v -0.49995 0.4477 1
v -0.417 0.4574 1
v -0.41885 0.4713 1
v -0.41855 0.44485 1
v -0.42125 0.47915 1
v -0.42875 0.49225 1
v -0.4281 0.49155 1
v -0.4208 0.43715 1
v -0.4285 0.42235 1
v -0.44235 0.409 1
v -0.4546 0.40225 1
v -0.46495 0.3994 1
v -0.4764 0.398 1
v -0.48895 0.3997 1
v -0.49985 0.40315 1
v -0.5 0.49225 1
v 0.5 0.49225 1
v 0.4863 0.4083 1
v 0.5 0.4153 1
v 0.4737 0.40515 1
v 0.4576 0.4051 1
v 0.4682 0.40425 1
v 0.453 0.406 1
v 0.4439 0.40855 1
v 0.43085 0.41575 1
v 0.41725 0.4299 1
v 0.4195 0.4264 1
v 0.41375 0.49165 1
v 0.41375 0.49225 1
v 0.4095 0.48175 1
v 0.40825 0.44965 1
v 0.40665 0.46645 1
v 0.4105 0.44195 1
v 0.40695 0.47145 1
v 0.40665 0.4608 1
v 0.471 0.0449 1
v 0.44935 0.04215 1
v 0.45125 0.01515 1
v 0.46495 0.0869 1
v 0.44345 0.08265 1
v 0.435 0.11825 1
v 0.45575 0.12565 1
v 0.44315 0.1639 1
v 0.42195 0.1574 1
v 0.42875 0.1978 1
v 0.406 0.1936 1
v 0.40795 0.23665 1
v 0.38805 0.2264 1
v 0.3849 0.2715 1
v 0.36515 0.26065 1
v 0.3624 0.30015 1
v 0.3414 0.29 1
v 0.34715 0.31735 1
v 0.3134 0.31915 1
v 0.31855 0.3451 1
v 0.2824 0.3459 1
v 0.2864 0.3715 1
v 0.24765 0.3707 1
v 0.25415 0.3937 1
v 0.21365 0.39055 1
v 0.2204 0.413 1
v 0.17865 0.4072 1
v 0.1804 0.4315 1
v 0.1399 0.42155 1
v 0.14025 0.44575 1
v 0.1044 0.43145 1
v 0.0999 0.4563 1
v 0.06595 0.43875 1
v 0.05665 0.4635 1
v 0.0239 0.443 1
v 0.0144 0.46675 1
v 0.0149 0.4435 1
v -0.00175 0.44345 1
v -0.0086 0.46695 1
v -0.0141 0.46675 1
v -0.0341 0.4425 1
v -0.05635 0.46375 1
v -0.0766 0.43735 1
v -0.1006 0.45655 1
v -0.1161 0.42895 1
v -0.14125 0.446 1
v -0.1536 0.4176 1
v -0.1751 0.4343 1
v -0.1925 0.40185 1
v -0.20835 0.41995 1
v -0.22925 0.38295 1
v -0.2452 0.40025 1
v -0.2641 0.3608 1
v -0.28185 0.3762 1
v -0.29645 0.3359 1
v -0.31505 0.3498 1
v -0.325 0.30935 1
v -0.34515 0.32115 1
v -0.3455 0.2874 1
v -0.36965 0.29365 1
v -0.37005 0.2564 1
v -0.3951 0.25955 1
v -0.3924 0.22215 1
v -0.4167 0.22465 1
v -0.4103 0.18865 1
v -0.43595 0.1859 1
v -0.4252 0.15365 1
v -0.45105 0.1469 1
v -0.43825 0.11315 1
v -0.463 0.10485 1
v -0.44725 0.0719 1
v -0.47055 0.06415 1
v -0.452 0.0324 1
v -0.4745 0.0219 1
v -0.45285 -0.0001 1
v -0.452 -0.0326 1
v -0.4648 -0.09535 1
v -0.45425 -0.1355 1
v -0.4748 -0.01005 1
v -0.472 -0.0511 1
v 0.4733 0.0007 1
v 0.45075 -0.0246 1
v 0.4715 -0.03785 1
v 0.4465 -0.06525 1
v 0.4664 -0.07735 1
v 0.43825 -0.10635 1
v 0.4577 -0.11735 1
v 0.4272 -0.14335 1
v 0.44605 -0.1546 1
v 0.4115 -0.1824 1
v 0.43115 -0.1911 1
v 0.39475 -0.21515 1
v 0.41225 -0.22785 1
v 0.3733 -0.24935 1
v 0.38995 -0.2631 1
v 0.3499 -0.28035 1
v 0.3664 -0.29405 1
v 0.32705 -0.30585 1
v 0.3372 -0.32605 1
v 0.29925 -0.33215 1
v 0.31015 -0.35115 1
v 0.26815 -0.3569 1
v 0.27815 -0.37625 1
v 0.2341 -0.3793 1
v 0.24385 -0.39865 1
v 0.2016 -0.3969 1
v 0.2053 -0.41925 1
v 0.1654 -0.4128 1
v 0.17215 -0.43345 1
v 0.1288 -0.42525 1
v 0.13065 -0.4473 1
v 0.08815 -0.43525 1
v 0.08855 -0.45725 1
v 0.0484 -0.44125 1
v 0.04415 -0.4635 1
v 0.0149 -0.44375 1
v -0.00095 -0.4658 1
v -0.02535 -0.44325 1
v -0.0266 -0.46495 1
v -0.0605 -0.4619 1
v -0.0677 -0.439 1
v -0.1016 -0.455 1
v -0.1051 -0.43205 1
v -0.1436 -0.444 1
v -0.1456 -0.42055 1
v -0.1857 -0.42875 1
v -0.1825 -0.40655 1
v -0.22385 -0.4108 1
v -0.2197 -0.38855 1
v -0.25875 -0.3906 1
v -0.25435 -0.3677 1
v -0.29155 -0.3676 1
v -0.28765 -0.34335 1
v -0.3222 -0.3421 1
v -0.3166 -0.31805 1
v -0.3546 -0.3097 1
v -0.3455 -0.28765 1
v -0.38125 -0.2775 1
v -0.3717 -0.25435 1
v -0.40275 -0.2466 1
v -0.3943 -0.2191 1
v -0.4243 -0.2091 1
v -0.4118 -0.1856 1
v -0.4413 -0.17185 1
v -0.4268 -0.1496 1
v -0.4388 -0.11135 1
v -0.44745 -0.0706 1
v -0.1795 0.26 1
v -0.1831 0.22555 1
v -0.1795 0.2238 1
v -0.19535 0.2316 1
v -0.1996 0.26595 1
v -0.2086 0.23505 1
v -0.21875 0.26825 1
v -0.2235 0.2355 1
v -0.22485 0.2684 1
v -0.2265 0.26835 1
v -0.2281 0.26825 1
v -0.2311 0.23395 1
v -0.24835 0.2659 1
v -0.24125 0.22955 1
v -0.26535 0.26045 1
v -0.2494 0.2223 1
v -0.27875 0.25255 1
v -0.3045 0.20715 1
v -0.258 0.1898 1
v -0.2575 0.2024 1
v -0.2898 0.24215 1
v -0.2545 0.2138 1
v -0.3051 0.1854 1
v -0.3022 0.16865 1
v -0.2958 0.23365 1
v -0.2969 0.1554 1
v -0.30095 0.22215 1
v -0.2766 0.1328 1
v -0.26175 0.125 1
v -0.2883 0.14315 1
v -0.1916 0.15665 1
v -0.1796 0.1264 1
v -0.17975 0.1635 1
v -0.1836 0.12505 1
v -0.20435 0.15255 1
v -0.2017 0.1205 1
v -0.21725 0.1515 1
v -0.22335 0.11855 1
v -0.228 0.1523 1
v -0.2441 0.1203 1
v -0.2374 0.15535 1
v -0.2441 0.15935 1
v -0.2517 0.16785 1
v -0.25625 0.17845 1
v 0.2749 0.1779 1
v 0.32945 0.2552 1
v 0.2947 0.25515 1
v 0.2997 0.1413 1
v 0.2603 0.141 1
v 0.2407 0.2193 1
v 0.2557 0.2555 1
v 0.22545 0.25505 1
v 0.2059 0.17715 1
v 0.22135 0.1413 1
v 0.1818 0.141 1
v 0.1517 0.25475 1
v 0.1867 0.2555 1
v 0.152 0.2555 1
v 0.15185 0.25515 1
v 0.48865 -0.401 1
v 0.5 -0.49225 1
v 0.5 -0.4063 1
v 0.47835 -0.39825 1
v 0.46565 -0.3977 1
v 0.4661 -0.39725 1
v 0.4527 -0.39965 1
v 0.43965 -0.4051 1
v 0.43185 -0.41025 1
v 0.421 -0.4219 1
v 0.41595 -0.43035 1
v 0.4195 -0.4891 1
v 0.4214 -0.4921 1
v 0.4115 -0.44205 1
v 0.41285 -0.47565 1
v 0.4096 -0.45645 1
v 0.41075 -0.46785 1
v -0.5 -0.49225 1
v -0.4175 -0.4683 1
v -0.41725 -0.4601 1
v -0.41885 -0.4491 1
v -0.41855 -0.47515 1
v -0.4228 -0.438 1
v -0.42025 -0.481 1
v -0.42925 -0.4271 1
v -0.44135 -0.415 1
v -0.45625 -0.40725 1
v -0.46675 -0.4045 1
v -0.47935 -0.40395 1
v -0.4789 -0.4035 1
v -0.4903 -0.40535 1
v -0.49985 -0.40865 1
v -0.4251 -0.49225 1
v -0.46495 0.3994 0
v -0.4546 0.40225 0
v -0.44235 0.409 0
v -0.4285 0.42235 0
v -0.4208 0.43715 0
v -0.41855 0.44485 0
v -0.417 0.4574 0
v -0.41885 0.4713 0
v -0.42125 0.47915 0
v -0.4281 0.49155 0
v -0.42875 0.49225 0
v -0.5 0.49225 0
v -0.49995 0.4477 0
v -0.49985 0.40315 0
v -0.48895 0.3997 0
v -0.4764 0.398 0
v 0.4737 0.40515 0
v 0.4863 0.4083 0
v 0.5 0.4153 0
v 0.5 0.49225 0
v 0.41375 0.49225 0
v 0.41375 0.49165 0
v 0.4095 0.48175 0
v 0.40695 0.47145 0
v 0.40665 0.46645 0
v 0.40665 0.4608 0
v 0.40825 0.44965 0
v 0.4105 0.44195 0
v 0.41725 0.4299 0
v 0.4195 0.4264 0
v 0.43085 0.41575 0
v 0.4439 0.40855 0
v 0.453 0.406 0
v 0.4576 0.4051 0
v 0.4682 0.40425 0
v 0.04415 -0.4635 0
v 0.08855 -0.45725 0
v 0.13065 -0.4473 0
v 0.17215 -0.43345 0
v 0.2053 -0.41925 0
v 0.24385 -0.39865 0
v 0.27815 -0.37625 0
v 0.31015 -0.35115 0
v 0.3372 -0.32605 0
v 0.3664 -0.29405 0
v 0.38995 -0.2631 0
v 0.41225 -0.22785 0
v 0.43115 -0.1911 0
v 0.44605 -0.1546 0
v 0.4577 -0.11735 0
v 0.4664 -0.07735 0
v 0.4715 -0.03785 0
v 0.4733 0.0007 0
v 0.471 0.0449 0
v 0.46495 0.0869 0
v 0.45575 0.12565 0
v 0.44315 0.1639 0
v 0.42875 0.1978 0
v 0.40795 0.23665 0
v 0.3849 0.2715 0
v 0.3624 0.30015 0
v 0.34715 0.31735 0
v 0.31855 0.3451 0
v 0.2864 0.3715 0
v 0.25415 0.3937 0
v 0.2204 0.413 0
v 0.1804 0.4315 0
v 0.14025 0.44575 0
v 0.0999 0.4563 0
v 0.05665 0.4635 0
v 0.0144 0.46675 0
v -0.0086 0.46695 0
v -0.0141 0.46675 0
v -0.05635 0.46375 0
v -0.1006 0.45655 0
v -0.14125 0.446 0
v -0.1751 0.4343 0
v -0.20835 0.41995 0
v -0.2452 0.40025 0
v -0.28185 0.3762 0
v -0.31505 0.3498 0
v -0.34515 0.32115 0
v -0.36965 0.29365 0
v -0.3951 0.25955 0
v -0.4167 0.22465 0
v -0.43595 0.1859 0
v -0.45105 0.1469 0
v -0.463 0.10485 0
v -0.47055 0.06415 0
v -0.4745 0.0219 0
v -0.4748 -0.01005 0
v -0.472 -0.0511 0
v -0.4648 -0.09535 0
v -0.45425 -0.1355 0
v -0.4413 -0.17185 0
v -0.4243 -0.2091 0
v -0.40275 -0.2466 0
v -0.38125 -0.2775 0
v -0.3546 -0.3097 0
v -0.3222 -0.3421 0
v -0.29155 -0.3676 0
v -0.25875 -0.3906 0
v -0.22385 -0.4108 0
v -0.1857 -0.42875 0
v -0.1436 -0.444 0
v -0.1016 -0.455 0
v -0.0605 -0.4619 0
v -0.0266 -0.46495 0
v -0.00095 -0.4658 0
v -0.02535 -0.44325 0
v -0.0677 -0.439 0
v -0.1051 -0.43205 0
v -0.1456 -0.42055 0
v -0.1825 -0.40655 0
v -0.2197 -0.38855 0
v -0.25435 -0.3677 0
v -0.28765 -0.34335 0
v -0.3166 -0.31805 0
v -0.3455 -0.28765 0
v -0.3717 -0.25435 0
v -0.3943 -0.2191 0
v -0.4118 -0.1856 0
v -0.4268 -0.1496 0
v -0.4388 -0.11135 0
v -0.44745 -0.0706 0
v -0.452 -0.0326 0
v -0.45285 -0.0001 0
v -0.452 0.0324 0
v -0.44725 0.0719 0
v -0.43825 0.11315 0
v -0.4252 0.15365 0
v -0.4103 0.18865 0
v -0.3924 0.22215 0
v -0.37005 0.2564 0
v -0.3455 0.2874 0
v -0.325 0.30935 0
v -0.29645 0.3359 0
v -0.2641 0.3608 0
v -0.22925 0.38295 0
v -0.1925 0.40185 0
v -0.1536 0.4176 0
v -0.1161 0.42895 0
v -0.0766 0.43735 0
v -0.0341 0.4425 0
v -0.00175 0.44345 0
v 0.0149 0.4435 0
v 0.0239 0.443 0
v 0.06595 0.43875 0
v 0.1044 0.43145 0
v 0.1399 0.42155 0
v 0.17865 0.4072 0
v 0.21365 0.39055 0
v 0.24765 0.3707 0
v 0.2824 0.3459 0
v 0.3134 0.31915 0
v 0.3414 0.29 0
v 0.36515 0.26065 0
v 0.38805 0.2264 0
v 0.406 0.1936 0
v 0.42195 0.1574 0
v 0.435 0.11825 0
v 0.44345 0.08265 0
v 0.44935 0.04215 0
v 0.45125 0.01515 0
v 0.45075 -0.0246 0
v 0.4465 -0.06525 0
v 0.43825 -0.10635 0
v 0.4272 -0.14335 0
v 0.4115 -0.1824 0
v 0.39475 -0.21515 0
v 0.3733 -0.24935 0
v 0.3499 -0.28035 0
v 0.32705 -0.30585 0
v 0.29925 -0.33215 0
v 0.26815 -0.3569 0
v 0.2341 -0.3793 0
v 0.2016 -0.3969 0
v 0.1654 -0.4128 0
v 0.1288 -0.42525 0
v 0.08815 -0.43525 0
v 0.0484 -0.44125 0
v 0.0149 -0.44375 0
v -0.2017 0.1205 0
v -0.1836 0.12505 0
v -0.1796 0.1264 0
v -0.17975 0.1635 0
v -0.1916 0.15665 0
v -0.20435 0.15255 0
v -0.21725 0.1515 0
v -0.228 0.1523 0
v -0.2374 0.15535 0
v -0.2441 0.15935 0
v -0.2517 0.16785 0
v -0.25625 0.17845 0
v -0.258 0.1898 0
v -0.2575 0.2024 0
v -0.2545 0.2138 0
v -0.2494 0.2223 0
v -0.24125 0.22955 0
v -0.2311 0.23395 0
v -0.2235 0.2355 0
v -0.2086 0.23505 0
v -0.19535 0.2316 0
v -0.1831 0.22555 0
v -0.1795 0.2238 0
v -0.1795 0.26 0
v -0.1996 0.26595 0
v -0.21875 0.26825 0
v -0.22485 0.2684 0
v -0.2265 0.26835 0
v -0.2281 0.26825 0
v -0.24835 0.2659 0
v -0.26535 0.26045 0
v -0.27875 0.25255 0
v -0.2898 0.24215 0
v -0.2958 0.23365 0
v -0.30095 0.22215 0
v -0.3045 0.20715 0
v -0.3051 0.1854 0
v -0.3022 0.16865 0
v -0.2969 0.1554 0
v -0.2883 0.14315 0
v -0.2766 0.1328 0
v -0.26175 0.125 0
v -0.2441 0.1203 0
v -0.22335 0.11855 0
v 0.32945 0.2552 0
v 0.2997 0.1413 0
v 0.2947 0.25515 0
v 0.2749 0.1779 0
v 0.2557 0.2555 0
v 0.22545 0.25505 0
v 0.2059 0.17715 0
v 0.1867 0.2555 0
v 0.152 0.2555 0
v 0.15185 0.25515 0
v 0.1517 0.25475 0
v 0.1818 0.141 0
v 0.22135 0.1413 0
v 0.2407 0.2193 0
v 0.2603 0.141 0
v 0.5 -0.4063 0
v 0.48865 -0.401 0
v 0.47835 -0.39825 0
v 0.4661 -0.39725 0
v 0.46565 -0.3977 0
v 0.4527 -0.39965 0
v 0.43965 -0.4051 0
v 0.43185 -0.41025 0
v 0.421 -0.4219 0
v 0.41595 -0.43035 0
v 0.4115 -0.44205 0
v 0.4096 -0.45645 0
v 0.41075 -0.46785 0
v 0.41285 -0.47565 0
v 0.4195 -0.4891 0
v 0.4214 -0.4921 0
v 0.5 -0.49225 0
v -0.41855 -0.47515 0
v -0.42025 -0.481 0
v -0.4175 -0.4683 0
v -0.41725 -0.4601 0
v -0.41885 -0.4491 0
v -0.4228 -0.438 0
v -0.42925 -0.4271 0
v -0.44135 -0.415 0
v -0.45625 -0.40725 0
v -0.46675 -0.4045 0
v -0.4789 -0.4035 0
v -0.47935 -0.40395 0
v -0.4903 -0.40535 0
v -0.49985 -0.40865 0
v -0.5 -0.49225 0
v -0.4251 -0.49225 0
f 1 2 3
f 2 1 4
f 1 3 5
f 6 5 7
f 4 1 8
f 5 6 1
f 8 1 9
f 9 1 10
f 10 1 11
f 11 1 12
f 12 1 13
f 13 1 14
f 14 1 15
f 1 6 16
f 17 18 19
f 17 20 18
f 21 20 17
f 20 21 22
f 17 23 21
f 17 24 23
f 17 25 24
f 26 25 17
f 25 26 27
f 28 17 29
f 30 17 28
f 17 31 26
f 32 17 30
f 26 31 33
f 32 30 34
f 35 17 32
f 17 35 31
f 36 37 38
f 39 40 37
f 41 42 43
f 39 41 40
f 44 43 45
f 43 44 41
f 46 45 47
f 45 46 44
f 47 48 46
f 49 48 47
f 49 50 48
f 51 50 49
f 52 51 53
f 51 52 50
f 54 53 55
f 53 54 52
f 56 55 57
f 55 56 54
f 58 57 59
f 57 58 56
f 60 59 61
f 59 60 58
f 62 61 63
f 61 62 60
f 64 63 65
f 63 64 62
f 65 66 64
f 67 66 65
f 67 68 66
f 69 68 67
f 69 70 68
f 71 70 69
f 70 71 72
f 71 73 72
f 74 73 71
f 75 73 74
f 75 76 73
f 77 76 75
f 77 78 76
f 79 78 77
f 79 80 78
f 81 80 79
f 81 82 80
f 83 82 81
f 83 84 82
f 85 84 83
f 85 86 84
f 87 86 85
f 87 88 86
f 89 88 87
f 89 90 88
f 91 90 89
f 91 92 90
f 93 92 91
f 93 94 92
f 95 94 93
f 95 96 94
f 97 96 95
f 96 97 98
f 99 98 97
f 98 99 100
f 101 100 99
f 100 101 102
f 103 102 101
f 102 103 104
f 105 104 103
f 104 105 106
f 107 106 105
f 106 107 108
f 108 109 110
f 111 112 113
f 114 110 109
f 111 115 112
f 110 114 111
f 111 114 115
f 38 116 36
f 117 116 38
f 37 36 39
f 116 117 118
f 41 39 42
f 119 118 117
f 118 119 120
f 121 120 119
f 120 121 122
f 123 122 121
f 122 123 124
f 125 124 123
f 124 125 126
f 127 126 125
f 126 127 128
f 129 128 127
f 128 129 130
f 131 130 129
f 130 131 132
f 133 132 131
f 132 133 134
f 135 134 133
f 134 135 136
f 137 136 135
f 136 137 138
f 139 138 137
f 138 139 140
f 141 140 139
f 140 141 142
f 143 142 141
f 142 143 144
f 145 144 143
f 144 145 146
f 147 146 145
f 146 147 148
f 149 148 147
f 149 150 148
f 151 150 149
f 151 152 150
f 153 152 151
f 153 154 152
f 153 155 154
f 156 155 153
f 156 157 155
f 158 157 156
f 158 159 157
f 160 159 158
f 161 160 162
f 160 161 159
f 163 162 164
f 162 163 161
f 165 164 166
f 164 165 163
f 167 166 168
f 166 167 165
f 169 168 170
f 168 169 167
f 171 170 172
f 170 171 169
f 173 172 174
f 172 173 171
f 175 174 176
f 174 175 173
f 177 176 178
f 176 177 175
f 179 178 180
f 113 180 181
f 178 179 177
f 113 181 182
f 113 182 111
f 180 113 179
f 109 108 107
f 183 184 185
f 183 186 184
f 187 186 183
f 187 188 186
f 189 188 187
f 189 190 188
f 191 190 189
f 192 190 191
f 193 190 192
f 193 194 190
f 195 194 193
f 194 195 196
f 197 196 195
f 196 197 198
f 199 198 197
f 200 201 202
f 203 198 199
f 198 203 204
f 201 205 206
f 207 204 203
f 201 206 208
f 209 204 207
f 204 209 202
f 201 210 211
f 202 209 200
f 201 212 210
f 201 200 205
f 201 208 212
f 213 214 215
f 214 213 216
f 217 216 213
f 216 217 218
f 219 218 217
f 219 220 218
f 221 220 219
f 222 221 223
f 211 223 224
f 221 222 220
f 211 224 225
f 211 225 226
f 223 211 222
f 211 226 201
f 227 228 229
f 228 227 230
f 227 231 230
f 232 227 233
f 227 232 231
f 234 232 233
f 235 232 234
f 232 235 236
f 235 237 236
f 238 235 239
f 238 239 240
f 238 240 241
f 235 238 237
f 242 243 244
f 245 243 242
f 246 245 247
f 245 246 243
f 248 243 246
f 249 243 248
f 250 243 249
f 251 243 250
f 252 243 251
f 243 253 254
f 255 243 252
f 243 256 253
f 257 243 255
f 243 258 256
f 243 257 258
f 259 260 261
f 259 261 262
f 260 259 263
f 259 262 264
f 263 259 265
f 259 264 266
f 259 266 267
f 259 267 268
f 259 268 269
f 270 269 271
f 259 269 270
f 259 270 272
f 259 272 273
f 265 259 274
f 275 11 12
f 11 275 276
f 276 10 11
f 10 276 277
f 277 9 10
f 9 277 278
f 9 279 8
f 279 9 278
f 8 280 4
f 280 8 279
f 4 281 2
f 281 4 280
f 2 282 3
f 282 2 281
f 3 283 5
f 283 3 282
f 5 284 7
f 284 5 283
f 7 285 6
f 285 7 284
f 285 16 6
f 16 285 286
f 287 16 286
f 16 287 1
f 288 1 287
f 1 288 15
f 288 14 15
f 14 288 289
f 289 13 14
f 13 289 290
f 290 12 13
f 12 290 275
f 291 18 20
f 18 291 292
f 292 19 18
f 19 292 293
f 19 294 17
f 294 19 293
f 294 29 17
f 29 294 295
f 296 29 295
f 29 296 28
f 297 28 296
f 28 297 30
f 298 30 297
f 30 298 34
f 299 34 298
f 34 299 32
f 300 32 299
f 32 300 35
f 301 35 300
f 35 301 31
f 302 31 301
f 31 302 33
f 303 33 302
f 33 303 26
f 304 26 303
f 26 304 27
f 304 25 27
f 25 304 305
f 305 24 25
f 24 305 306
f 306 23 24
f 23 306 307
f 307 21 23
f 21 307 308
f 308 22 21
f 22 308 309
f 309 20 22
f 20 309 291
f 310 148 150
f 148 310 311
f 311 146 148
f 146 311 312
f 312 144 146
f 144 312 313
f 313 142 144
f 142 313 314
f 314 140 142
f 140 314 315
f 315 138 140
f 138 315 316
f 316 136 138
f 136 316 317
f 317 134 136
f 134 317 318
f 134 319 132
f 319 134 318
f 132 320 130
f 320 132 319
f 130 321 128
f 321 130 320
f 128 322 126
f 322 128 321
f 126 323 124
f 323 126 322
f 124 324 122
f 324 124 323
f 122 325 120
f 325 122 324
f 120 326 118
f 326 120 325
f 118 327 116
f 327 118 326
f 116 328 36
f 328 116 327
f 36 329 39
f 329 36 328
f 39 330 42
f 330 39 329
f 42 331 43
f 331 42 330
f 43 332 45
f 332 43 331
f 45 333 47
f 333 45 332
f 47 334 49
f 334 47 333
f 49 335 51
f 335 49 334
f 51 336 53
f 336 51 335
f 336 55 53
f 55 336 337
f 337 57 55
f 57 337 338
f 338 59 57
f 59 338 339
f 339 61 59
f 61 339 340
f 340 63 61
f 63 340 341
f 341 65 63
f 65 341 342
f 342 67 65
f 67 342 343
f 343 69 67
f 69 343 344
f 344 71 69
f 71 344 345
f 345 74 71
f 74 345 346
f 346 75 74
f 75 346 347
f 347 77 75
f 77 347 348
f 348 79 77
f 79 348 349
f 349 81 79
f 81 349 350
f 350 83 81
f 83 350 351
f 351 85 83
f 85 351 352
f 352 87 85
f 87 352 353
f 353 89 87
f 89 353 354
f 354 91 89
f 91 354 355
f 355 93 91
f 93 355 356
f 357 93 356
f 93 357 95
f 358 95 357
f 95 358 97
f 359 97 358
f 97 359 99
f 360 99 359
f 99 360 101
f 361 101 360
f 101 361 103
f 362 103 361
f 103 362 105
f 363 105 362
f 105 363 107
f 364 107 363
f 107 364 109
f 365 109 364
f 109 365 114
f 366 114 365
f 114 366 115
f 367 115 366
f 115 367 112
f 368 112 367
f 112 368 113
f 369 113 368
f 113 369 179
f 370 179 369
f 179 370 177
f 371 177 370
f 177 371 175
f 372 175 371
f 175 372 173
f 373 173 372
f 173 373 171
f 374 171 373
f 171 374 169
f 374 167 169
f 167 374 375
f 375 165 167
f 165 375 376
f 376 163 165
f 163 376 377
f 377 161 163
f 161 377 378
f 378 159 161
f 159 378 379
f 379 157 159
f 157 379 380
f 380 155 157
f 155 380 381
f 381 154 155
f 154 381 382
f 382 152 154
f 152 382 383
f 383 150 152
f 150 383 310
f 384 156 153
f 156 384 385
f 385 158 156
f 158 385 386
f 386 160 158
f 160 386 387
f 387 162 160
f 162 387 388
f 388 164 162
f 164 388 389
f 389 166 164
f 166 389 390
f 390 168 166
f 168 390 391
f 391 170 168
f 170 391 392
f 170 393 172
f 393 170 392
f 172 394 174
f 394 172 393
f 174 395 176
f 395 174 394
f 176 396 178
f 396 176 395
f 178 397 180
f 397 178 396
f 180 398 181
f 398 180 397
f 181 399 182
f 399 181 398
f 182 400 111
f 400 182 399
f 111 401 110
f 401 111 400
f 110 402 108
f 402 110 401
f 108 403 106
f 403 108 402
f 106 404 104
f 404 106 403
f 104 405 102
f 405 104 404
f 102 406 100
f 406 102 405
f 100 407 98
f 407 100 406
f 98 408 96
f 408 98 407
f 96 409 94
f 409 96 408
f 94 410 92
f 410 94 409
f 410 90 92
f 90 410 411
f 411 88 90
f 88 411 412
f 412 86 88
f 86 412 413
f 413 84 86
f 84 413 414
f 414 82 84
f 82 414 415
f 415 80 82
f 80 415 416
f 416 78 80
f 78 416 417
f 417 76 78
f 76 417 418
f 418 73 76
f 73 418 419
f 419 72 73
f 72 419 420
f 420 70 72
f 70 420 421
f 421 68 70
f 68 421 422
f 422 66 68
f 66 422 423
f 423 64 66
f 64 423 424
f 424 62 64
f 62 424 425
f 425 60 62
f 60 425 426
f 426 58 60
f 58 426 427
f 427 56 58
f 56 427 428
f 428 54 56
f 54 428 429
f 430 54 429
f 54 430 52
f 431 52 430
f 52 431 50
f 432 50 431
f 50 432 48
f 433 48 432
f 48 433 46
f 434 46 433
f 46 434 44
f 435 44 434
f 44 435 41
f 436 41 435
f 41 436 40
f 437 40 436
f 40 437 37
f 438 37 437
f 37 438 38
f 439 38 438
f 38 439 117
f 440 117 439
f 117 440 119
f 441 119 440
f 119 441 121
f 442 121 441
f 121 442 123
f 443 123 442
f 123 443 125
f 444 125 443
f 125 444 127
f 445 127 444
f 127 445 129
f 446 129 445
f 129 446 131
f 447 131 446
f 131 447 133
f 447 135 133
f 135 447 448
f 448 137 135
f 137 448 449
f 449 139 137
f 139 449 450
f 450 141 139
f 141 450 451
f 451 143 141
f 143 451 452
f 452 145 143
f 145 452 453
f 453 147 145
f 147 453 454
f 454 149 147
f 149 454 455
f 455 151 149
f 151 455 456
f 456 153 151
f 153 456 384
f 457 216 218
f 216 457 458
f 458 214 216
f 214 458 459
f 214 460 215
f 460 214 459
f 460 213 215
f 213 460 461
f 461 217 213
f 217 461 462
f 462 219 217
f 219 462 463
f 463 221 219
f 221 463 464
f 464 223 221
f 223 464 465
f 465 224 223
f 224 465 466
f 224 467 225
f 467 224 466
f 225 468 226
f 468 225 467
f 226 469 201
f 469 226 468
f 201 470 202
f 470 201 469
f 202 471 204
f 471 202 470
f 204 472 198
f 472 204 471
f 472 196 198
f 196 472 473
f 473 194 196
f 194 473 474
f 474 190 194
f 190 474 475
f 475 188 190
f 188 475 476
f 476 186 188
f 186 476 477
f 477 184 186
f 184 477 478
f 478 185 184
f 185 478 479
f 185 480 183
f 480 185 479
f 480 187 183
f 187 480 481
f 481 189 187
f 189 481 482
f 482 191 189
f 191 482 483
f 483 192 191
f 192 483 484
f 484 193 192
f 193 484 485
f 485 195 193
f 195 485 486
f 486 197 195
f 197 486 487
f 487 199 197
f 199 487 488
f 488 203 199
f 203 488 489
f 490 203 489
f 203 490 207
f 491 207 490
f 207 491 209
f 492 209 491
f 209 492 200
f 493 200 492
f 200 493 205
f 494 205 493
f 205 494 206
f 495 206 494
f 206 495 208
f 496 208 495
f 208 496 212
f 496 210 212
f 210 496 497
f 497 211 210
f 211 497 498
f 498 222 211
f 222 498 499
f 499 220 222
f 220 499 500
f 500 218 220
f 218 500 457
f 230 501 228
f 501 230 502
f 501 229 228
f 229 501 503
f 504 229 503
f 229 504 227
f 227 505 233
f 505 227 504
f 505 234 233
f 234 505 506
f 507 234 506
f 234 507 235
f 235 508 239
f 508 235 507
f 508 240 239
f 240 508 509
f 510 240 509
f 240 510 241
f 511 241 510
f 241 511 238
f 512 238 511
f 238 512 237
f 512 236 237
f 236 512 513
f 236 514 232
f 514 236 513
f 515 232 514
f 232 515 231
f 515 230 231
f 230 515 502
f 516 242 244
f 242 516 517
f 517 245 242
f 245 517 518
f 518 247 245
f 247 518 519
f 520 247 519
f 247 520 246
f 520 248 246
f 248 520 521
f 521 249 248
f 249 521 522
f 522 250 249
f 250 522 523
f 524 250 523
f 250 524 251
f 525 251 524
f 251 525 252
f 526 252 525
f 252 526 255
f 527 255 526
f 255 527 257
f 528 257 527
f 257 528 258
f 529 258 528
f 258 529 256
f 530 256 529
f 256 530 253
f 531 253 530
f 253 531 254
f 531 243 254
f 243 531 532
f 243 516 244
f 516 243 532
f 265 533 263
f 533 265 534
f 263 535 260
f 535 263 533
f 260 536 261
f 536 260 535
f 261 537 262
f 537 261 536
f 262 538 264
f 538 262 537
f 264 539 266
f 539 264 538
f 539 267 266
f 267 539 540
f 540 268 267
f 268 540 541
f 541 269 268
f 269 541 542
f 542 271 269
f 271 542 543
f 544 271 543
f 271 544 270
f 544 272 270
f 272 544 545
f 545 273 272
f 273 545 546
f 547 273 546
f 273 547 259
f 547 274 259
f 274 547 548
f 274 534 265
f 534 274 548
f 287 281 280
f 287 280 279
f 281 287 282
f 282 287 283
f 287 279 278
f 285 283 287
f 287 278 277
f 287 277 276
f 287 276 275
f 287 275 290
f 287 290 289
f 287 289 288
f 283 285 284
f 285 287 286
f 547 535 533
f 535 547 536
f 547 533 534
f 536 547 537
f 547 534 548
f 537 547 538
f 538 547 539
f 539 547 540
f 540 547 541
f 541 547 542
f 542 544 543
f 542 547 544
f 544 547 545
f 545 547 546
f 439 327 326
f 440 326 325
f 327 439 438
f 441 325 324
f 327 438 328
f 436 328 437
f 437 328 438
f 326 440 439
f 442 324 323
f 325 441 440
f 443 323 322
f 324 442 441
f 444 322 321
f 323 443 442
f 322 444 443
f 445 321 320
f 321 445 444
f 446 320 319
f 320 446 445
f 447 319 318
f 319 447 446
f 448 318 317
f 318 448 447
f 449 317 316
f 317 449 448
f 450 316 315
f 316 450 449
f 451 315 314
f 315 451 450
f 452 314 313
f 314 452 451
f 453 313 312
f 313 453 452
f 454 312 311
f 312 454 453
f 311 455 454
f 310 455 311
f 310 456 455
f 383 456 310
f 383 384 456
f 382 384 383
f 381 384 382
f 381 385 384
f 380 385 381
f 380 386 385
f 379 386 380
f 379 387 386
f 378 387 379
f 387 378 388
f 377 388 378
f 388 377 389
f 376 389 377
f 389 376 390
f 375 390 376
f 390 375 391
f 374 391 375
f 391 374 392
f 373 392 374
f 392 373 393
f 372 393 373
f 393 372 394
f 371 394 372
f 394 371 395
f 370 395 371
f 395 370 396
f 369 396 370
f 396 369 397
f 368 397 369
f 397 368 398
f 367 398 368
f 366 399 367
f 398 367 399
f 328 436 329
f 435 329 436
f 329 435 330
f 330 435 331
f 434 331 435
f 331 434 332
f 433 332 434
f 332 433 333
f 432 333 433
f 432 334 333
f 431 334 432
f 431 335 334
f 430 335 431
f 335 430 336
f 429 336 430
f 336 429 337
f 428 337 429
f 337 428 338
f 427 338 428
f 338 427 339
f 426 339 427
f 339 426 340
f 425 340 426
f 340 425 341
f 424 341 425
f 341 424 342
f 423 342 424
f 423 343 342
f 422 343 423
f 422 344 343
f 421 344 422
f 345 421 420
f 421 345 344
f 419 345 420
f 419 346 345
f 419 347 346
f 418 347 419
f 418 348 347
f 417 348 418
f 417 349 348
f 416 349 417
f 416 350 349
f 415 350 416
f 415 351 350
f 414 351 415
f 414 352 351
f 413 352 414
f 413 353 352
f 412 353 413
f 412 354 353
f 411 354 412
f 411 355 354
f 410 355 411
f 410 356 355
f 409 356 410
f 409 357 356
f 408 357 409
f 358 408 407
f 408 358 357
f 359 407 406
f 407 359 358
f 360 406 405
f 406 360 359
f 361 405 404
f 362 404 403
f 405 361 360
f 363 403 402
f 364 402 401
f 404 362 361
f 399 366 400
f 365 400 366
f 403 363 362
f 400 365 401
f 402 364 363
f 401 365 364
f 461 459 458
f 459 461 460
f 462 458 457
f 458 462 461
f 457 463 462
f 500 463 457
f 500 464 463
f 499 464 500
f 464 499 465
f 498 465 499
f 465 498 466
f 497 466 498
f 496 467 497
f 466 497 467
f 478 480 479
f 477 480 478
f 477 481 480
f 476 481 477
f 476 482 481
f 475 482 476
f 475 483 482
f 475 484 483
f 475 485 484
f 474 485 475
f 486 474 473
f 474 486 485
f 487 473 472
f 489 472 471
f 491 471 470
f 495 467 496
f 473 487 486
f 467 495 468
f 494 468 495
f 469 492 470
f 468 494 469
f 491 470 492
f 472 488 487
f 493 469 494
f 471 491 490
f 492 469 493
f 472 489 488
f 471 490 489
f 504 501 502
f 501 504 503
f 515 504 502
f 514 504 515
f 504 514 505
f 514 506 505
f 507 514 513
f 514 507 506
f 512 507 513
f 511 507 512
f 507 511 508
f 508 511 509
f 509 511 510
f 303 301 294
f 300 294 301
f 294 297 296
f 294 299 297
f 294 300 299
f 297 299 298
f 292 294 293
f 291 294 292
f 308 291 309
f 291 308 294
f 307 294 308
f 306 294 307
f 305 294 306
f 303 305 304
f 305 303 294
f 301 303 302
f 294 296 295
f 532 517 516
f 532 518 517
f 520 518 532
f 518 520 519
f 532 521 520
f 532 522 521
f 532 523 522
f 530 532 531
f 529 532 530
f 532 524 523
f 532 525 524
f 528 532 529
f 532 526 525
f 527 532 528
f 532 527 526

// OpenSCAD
module C1white2_1()
{
 /* Generated by trace2scad version 20150415
    http://aggregate.org/MAKE/TRACE2SCAD/
    Optimized model has 279/3068 original points
 */
 color([0.5, 0.5, 0.5])
 assign(minx=0) /* polygon minx=0 */
 assign(miny=0) /* polygon miny=0 */
 assign(maxx=20000) /* polygon maxx=20000 */
 assign(maxy=19690) /* polygon maxy=19690 */
 assign(dx=maxx-minx)
 assign(dy=maxy-miny)
 assign(maxd=((dx>dy)?dx:dy))
 scale([1/maxd, 1/maxd, 1])
 translate([-minx-dx/2, -miny-dy/2, 0])
 linear_extrude(height=1, convexity=279)
 union() {
  union() {
   polygon([[1,18799],[3,17908],[221,17839],[472,17805],[701,17833],[908,17890],[1153,18025],[1430,18292],[1584,18588],[1629,18742],[1660,18993],[1623,19271],[1575,19428],[1438,19676],[1425,19690],[0,19690]], convexity=5);
   polygon([[18275,19684],[18275,19678],[18190,19480],[18139,19274],[18133,19174],[18133,19061],[18165,18838],[18210,18684],[18345,18443],[18390,18373],[18617,18160],[18878,18016],[19060,17965],[19152,17947],[19364,17930],[19474,17948],[19726,18011],[20000,18151],[20000,19690],[18275,19690]], convexity=7);
   union() {
    difference() {
     polygon([[9773,19182],[9718,19180],[8873,19120],[7988,18976],[7175,18765],[6498,18531],[5833,18244],[5096,17850],[4363,17369],[3699,16841],[3097,16268],[2607,15718],[2098,15036],[1666,14338],[1281,13563],[979,12783],[740,11942],[589,11128],[510,10283],[504,9644],[560,8823],[704,7938],[915,7135],[1174,6408],[1514,5663],[1945,4913],[2375,4295],[2908,3651],[3556,3003],[4169,2493],[4825,2033],[5523,1629],[6286,1270],[7128,965],[7968,745],[8790,607],[9468,546],[9981,529],[10883,575],[11771,700],[12613,899],[13443,1176],[14106,1460],[14877,1872],[15563,2320],[16203,2822],[16744,3324],[17328,3964],[17799,4583],[18245,5288],[18623,6023],[18921,6753],[19154,7498],[19328,8298],[19430,9088],[19466,9859],[19420,10743],[19299,11583],[19115,12358],[18863,13123],[18575,13801],[18159,14578],[17698,15275],[17248,15848],[16943,16192],[16371,16747],[15728,17275],[15083,17719],[14408,18105],[13608,18475],[12805,18760],[11998,18971],[11133,19115],[10288,19180],[9828,19184]], convexity=6);
     polygon([[10388,18710],[10478,18705],[11319,18620],[12088,18474],[12798,18276],[13573,17989],[14273,17656],[14953,17259],[15648,16763],[16268,16228],[16828,15645],[17303,15058],[17761,14373],[18120,13717],[18439,12993],[18700,12210],[18869,11498],[18987,10688],[19025,10148],[19015,9353],[18930,8540],[18765,7718],[18544,6978],[18230,6197],[17895,5542],[17466,4858],[16998,4238],[16541,3728],[15985,3202],[15363,2707],[14682,2259],[14032,1907],[13308,1589],[12576,1340],[11763,1140],[10968,1020],[10298,970],[9493,980],[8646,1065],[7898,1204],[7088,1434],[6350,1714],[5606,2074],[4913,2491],[4247,2978],[3668,3484],[3090,4092],[2566,4758],[2114,5463],[1764,6133],[1464,6853],[1224,7618],[1051,8433],[960,9193],[943,9843],[960,10493],[1055,11283],[1235,12108],[1496,12918],[1794,13618],[2152,14288],[2599,14973],[3090,15593],[3500,16032],[4071,16563],[4718,17061],[5415,17504],[6150,17882],[6928,18197],[7678,18424],[8468,18592],[9318,18695],[9965,18714],[10298,18715]], convexity=6);
    }
    polygon([[5470,15212],[5438,15210],[5033,15163],[4693,15054],[4425,14896],[4204,14688],[4084,14518],[3981,14288],[3910,13988],[3898,13553],[3956,13218],[4062,12953],[4234,12708],[4468,12501],[4765,12345],[5118,12251],[5533,12216],[5966,12255],[6328,12346],[6408,12373],[6405,13115],[6168,12978],[5913,12896],[5655,12875],[5440,12891],[5252,12952],[5118,13032],[4966,13202],[4875,13414],[4840,13641],[4850,13893],[4910,14121],[5012,14291],[5175,14436],[5378,14524],[5530,14555],[5828,14546],[6093,14477],[6338,14356],[6410,14321],[6410,15045],[6008,15164],[5625,15210],[5503,15213]], convexity=12);
    polygon([[13037,14948],[13034,14940],[13636,12665],[14427,12671],[14814,14231],[15206,12665],[15994,12671],[16589,14949],[15894,14948],[15498,13403],[15114,14955],[14509,14946],[14118,13388],[13734,14955],[13040,14955]], convexity=11);
   }
   polygon([[19317,1895],[19313,1891],[19054,1852],[18793,1743],[18637,1640],[18420,1407],[18319,1238],[18230,1004],[18192,716],[18215,488],[18257,332],[18390,63],[18428,3],[20000,0],[20000,1719],[19773,1825],[19567,1880],[19322,1900]], convexity=6);
   polygon([[417,1770],[413,1766],[194,1738],[3,1672],[0,0],[1498,0],[1595,225],[1629,342],[1650,479],[1655,643],[1623,863],[1544,1085],[1415,1303],[1173,1545],[875,1700],[665,1755],[422,1775]], convexity=5);
  }
 }
}

module C1white2()
{
 /* all layers combined, scaled to within a 1mm cube */
 scale([1, 1, 1/1])
 difference() {
  union() {
   scale([1,1,2]) translate([0,0,-0.5]) C1white2_1();
  }
  translate([0,0,-2]) cube([2,2,4],center=true);
 }
}
C1white2();
